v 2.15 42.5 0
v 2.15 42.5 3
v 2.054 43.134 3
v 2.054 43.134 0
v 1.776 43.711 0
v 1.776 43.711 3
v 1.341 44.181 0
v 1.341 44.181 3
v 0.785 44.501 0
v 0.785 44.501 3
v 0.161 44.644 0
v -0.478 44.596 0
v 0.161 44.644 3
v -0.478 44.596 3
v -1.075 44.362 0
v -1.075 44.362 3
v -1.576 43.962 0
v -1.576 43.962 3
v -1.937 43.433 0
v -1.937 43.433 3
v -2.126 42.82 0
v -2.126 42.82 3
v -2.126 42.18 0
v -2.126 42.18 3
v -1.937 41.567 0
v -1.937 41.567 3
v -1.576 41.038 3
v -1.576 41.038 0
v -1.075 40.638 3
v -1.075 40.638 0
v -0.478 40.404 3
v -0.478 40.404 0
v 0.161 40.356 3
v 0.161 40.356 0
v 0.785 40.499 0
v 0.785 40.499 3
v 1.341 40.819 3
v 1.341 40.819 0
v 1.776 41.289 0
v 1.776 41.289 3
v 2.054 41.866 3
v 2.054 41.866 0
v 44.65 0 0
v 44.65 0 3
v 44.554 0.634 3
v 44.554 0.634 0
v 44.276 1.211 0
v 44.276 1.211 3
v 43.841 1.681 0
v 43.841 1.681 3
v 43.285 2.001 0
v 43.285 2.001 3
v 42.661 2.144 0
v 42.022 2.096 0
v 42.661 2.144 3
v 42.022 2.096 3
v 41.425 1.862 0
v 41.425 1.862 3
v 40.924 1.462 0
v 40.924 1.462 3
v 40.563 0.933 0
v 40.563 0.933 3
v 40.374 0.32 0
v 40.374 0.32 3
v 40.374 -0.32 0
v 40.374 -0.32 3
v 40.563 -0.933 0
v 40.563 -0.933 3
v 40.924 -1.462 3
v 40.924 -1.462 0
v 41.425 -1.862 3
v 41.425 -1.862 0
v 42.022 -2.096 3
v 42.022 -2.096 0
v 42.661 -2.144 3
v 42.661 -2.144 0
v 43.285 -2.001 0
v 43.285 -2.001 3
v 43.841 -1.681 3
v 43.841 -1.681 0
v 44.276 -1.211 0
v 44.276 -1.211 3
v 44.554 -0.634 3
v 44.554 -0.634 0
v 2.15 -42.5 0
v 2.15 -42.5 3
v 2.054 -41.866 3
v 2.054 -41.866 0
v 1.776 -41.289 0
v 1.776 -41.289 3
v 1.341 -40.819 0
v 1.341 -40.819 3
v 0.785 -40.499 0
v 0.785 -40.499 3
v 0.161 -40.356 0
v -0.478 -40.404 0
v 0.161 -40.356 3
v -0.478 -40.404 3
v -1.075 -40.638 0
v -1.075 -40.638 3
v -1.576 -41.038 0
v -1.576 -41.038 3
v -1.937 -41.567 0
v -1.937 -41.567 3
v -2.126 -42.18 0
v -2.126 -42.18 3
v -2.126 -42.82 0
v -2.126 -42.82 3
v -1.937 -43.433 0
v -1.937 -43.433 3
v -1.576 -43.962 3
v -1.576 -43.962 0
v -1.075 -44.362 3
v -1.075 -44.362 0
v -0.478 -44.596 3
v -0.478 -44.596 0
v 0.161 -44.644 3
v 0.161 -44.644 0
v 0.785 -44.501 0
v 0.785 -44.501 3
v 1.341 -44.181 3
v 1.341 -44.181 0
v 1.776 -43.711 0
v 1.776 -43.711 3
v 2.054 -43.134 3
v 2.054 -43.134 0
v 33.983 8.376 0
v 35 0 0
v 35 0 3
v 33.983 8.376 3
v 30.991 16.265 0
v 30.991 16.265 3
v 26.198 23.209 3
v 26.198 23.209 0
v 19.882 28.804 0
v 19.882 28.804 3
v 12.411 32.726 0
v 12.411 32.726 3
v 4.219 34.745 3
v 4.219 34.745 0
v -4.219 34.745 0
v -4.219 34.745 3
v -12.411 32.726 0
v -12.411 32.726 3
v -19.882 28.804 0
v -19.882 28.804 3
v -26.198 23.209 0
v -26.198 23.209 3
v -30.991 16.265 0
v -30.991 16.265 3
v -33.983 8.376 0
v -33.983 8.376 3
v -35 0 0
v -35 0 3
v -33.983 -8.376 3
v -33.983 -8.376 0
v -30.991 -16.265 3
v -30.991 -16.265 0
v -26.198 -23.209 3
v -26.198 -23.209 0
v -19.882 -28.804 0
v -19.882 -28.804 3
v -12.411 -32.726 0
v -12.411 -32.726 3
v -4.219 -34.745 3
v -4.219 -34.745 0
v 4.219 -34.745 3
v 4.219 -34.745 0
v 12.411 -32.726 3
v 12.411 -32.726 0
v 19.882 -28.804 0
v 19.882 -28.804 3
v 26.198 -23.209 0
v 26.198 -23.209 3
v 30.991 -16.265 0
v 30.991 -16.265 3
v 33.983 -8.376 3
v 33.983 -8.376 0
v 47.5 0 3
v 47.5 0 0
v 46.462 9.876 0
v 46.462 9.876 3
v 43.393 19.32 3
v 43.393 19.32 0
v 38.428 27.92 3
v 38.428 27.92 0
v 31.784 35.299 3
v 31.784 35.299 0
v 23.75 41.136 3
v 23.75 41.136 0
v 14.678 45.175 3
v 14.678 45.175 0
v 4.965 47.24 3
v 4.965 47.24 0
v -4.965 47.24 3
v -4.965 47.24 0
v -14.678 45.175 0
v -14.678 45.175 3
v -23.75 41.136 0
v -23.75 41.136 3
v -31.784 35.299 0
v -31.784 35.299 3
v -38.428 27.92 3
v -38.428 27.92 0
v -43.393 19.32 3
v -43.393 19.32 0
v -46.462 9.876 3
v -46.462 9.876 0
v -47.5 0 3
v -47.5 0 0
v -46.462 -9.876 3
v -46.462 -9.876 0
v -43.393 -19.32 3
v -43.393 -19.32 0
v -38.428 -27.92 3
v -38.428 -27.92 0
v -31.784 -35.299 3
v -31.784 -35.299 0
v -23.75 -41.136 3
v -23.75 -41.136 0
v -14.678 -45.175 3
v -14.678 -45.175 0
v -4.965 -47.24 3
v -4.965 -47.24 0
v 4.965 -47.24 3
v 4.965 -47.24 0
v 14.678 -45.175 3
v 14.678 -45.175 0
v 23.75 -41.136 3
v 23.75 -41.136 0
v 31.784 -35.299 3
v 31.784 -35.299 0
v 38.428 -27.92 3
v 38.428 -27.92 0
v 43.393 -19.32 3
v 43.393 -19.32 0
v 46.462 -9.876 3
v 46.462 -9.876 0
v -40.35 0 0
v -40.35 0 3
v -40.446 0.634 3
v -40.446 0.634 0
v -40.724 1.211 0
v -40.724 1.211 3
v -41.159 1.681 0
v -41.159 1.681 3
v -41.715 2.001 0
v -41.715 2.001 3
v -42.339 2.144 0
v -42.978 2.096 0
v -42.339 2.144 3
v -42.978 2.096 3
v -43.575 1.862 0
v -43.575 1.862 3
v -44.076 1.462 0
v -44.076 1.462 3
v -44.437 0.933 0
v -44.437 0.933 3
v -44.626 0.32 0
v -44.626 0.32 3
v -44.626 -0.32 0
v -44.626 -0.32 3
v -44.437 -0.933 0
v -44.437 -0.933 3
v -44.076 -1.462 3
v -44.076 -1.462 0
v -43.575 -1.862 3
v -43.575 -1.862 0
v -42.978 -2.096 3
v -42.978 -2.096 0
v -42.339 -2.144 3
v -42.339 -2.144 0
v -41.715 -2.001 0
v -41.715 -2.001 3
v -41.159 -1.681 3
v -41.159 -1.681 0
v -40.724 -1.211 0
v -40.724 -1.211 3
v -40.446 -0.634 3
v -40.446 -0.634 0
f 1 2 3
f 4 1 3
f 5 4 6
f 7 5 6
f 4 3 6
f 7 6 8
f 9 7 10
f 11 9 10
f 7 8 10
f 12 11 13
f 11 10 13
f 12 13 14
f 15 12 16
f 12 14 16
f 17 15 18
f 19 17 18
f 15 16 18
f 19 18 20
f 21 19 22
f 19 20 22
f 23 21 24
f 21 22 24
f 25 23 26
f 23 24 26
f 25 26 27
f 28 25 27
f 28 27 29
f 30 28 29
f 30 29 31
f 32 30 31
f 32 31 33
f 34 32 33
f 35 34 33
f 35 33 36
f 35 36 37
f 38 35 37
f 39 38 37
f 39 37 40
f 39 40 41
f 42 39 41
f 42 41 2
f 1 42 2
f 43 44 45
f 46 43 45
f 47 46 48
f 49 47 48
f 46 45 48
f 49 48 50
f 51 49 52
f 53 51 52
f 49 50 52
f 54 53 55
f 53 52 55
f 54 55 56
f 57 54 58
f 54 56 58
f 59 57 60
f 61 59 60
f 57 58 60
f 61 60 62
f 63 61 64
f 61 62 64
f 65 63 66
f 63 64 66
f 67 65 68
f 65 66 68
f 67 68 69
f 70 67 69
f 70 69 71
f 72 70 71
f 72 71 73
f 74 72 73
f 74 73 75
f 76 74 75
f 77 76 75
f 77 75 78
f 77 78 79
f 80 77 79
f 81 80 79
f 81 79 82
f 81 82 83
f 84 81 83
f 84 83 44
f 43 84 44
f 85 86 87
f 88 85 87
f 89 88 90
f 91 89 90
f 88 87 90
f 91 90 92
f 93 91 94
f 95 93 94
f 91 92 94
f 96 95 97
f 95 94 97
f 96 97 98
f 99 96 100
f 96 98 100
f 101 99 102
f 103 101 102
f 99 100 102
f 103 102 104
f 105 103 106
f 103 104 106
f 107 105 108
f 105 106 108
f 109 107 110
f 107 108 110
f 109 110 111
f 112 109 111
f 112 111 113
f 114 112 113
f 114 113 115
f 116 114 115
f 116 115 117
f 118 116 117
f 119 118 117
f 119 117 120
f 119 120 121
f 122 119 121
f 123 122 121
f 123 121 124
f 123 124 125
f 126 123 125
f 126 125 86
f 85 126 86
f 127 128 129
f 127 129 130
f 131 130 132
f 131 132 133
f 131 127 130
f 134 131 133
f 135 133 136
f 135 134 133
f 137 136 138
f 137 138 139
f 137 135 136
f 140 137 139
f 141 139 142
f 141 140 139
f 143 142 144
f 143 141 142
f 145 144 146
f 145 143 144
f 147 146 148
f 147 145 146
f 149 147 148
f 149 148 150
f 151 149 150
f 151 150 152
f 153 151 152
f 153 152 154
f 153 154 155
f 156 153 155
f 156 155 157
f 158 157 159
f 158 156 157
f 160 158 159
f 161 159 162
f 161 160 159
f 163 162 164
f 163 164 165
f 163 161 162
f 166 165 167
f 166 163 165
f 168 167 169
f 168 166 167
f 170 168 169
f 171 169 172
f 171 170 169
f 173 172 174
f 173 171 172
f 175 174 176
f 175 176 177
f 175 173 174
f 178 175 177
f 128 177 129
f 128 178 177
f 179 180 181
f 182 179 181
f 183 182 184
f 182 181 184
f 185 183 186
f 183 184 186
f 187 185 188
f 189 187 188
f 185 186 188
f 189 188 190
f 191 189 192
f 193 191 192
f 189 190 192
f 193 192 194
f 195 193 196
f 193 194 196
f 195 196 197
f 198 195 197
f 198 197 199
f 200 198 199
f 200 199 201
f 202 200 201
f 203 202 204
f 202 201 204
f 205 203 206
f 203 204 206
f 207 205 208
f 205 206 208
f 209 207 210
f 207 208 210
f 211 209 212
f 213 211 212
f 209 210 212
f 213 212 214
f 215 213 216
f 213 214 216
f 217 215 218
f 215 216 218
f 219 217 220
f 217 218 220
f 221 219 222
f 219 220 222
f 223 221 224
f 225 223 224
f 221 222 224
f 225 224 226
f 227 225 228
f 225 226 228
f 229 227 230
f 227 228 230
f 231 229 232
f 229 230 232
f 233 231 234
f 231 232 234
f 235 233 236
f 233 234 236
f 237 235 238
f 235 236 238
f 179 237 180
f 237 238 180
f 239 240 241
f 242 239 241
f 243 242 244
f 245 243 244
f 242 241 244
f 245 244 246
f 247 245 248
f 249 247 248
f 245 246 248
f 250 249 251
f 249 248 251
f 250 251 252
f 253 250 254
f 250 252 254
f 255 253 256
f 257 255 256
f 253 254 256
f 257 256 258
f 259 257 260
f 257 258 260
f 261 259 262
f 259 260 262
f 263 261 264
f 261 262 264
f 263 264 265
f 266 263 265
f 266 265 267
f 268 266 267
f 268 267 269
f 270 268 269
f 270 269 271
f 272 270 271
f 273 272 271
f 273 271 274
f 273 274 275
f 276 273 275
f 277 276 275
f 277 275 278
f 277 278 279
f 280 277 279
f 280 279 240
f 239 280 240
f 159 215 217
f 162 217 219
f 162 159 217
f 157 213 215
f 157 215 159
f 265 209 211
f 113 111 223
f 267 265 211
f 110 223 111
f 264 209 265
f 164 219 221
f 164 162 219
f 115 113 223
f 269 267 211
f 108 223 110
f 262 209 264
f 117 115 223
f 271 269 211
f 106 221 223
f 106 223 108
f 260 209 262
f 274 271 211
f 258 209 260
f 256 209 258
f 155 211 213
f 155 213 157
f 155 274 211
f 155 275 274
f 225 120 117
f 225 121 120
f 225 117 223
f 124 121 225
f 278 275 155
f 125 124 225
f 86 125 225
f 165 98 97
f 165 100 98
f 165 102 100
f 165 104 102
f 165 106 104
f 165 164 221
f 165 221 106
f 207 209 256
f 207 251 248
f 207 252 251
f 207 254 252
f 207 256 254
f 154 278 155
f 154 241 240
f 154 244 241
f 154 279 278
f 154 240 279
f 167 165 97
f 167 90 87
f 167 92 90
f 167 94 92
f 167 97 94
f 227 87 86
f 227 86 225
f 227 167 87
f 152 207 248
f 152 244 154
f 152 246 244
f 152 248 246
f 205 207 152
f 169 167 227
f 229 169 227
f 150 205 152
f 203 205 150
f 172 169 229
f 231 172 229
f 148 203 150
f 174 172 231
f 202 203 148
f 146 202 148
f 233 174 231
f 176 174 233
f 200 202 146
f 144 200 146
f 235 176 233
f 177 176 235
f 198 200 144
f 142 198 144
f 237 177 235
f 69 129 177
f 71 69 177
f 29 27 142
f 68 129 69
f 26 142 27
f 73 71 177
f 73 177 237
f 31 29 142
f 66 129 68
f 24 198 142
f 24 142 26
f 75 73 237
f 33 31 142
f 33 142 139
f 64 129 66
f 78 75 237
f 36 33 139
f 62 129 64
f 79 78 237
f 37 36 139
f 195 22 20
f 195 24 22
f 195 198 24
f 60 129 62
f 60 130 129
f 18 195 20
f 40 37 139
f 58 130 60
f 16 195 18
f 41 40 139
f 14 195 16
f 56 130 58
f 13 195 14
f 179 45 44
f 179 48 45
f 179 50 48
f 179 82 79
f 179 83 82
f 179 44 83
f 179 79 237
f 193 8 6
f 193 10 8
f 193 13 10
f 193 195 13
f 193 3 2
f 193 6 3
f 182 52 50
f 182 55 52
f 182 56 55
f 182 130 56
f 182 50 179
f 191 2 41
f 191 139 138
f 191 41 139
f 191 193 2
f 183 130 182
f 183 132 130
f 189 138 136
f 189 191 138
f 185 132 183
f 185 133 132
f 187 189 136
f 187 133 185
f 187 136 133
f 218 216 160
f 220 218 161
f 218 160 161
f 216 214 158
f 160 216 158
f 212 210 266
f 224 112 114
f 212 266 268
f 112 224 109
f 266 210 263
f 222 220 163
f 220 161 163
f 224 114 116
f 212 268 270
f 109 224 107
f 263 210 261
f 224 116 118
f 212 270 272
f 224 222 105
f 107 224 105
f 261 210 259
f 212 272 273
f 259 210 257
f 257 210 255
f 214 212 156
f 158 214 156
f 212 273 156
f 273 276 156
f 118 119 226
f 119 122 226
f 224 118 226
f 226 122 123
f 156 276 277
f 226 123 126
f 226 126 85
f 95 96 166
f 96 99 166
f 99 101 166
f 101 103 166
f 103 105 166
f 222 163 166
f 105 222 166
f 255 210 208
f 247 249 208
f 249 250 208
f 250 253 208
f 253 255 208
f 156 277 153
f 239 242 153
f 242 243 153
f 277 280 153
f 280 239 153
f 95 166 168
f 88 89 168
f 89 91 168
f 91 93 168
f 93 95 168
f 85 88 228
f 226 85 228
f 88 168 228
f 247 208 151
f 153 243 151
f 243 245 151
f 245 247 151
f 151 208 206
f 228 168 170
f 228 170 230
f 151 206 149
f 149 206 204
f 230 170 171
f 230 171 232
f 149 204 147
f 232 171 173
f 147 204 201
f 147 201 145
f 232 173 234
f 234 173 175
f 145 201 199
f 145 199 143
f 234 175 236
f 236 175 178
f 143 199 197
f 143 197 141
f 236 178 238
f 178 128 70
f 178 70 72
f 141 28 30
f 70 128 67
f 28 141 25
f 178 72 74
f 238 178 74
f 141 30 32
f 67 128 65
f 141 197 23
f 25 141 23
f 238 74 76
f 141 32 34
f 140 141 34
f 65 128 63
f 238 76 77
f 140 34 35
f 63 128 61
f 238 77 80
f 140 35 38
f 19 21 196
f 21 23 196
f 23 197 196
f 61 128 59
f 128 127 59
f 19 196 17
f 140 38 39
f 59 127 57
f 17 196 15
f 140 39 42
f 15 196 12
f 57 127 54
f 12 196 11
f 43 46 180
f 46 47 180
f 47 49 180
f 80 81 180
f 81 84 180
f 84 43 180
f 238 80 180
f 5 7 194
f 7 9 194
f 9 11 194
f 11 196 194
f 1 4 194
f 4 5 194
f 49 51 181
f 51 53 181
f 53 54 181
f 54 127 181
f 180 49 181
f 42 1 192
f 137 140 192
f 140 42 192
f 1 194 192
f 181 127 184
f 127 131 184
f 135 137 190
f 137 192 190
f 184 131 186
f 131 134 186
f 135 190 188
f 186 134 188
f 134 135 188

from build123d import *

# Parameters (mm, degrees)
SKETCH_1_R          = 47.5
SKETCH_1_R_2        = 35
EXTRUDE_1_DEPTH     = 3
CUT_EXTRUDE_1_REACH = 69.242
SKETCH_2_R          = 2.15


with BuildPart() as part:
    # 草图1 → 凸台-拉伸1 (new body)
    with BuildSketch(Plane.XY):
        Circle(SKETCH_1_R)
        Circle(SKETCH_1_R_2, mode=Mode.SUBTRACT)
    extrude(amount=EXTRUDE_1_DEPTH)

    # 草图2 → 切除-拉伸1 (cut, up to next)
    with BuildSketch(Plane.XY.offset(3), mode=Mode.PRIVATE) as cut_extrude_1_sk1:
        with Locations((42.5, 0)):
            Circle(SKETCH_2_R)
    cut_extrude_1_tool1 = extrude(cut_extrude_1_sk1.sketch, amount=-CUT_EXTRUDE_1_REACH, mode=Mode.PRIVATE) & part.part
    # 草图2 → 切除-拉伸1 (cut, up to next)
    with BuildSketch(Plane.XY.offset(3), mode=Mode.PRIVATE) as cut_extrude_1_sk2:
        with Locations((0, -42.5)):
            Circle(SKETCH_2_R)
    cut_extrude_1_tool2 = extrude(cut_extrude_1_sk2.sketch, amount=-CUT_EXTRUDE_1_REACH, mode=Mode.PRIVATE) & part.part
    # 草图2 → 切除-拉伸1 (cut, up to next)
    with BuildSketch(Plane.XY.offset(3), mode=Mode.PRIVATE) as cut_extrude_1_sk3:
        with Locations((-42.5, 0)):
            Circle(SKETCH_2_R)
    cut_extrude_1_tool3 = extrude(cut_extrude_1_sk3.sketch, amount=-CUT_EXTRUDE_1_REACH, mode=Mode.PRIVATE) & part.part
    # 草图2 → 切除-拉伸1 (cut, up to next)
    with BuildSketch(Plane.XY.offset(3), mode=Mode.PRIVATE) as cut_extrude_1_sk4:
        with Locations((0, 42.5)):
            Circle(SKETCH_2_R)
    cut_extrude_1_tool4 = extrude(cut_extrude_1_sk4.sketch, amount=-CUT_EXTRUDE_1_REACH, mode=Mode.PRIVATE) & part.part
    add(cut_extrude_1_tool1.solids().sort_by_distance((42.5, 0, 3))[0], mode=Mode.SUBTRACT)
    add(cut_extrude_1_tool2.solids().sort_by_distance((0, -42.5, 3))[0], mode=Mode.SUBTRACT)
    add(cut_extrude_1_tool3.solids().sort_by_distance((-42.5, 0, 3))[0], mode=Mode.SUBTRACT)
    add(cut_extrude_1_tool4.solids().sort_by_distance((0, 42.5, 3))[0], mode=Mode.SUBTRACT)


solid = part.part
